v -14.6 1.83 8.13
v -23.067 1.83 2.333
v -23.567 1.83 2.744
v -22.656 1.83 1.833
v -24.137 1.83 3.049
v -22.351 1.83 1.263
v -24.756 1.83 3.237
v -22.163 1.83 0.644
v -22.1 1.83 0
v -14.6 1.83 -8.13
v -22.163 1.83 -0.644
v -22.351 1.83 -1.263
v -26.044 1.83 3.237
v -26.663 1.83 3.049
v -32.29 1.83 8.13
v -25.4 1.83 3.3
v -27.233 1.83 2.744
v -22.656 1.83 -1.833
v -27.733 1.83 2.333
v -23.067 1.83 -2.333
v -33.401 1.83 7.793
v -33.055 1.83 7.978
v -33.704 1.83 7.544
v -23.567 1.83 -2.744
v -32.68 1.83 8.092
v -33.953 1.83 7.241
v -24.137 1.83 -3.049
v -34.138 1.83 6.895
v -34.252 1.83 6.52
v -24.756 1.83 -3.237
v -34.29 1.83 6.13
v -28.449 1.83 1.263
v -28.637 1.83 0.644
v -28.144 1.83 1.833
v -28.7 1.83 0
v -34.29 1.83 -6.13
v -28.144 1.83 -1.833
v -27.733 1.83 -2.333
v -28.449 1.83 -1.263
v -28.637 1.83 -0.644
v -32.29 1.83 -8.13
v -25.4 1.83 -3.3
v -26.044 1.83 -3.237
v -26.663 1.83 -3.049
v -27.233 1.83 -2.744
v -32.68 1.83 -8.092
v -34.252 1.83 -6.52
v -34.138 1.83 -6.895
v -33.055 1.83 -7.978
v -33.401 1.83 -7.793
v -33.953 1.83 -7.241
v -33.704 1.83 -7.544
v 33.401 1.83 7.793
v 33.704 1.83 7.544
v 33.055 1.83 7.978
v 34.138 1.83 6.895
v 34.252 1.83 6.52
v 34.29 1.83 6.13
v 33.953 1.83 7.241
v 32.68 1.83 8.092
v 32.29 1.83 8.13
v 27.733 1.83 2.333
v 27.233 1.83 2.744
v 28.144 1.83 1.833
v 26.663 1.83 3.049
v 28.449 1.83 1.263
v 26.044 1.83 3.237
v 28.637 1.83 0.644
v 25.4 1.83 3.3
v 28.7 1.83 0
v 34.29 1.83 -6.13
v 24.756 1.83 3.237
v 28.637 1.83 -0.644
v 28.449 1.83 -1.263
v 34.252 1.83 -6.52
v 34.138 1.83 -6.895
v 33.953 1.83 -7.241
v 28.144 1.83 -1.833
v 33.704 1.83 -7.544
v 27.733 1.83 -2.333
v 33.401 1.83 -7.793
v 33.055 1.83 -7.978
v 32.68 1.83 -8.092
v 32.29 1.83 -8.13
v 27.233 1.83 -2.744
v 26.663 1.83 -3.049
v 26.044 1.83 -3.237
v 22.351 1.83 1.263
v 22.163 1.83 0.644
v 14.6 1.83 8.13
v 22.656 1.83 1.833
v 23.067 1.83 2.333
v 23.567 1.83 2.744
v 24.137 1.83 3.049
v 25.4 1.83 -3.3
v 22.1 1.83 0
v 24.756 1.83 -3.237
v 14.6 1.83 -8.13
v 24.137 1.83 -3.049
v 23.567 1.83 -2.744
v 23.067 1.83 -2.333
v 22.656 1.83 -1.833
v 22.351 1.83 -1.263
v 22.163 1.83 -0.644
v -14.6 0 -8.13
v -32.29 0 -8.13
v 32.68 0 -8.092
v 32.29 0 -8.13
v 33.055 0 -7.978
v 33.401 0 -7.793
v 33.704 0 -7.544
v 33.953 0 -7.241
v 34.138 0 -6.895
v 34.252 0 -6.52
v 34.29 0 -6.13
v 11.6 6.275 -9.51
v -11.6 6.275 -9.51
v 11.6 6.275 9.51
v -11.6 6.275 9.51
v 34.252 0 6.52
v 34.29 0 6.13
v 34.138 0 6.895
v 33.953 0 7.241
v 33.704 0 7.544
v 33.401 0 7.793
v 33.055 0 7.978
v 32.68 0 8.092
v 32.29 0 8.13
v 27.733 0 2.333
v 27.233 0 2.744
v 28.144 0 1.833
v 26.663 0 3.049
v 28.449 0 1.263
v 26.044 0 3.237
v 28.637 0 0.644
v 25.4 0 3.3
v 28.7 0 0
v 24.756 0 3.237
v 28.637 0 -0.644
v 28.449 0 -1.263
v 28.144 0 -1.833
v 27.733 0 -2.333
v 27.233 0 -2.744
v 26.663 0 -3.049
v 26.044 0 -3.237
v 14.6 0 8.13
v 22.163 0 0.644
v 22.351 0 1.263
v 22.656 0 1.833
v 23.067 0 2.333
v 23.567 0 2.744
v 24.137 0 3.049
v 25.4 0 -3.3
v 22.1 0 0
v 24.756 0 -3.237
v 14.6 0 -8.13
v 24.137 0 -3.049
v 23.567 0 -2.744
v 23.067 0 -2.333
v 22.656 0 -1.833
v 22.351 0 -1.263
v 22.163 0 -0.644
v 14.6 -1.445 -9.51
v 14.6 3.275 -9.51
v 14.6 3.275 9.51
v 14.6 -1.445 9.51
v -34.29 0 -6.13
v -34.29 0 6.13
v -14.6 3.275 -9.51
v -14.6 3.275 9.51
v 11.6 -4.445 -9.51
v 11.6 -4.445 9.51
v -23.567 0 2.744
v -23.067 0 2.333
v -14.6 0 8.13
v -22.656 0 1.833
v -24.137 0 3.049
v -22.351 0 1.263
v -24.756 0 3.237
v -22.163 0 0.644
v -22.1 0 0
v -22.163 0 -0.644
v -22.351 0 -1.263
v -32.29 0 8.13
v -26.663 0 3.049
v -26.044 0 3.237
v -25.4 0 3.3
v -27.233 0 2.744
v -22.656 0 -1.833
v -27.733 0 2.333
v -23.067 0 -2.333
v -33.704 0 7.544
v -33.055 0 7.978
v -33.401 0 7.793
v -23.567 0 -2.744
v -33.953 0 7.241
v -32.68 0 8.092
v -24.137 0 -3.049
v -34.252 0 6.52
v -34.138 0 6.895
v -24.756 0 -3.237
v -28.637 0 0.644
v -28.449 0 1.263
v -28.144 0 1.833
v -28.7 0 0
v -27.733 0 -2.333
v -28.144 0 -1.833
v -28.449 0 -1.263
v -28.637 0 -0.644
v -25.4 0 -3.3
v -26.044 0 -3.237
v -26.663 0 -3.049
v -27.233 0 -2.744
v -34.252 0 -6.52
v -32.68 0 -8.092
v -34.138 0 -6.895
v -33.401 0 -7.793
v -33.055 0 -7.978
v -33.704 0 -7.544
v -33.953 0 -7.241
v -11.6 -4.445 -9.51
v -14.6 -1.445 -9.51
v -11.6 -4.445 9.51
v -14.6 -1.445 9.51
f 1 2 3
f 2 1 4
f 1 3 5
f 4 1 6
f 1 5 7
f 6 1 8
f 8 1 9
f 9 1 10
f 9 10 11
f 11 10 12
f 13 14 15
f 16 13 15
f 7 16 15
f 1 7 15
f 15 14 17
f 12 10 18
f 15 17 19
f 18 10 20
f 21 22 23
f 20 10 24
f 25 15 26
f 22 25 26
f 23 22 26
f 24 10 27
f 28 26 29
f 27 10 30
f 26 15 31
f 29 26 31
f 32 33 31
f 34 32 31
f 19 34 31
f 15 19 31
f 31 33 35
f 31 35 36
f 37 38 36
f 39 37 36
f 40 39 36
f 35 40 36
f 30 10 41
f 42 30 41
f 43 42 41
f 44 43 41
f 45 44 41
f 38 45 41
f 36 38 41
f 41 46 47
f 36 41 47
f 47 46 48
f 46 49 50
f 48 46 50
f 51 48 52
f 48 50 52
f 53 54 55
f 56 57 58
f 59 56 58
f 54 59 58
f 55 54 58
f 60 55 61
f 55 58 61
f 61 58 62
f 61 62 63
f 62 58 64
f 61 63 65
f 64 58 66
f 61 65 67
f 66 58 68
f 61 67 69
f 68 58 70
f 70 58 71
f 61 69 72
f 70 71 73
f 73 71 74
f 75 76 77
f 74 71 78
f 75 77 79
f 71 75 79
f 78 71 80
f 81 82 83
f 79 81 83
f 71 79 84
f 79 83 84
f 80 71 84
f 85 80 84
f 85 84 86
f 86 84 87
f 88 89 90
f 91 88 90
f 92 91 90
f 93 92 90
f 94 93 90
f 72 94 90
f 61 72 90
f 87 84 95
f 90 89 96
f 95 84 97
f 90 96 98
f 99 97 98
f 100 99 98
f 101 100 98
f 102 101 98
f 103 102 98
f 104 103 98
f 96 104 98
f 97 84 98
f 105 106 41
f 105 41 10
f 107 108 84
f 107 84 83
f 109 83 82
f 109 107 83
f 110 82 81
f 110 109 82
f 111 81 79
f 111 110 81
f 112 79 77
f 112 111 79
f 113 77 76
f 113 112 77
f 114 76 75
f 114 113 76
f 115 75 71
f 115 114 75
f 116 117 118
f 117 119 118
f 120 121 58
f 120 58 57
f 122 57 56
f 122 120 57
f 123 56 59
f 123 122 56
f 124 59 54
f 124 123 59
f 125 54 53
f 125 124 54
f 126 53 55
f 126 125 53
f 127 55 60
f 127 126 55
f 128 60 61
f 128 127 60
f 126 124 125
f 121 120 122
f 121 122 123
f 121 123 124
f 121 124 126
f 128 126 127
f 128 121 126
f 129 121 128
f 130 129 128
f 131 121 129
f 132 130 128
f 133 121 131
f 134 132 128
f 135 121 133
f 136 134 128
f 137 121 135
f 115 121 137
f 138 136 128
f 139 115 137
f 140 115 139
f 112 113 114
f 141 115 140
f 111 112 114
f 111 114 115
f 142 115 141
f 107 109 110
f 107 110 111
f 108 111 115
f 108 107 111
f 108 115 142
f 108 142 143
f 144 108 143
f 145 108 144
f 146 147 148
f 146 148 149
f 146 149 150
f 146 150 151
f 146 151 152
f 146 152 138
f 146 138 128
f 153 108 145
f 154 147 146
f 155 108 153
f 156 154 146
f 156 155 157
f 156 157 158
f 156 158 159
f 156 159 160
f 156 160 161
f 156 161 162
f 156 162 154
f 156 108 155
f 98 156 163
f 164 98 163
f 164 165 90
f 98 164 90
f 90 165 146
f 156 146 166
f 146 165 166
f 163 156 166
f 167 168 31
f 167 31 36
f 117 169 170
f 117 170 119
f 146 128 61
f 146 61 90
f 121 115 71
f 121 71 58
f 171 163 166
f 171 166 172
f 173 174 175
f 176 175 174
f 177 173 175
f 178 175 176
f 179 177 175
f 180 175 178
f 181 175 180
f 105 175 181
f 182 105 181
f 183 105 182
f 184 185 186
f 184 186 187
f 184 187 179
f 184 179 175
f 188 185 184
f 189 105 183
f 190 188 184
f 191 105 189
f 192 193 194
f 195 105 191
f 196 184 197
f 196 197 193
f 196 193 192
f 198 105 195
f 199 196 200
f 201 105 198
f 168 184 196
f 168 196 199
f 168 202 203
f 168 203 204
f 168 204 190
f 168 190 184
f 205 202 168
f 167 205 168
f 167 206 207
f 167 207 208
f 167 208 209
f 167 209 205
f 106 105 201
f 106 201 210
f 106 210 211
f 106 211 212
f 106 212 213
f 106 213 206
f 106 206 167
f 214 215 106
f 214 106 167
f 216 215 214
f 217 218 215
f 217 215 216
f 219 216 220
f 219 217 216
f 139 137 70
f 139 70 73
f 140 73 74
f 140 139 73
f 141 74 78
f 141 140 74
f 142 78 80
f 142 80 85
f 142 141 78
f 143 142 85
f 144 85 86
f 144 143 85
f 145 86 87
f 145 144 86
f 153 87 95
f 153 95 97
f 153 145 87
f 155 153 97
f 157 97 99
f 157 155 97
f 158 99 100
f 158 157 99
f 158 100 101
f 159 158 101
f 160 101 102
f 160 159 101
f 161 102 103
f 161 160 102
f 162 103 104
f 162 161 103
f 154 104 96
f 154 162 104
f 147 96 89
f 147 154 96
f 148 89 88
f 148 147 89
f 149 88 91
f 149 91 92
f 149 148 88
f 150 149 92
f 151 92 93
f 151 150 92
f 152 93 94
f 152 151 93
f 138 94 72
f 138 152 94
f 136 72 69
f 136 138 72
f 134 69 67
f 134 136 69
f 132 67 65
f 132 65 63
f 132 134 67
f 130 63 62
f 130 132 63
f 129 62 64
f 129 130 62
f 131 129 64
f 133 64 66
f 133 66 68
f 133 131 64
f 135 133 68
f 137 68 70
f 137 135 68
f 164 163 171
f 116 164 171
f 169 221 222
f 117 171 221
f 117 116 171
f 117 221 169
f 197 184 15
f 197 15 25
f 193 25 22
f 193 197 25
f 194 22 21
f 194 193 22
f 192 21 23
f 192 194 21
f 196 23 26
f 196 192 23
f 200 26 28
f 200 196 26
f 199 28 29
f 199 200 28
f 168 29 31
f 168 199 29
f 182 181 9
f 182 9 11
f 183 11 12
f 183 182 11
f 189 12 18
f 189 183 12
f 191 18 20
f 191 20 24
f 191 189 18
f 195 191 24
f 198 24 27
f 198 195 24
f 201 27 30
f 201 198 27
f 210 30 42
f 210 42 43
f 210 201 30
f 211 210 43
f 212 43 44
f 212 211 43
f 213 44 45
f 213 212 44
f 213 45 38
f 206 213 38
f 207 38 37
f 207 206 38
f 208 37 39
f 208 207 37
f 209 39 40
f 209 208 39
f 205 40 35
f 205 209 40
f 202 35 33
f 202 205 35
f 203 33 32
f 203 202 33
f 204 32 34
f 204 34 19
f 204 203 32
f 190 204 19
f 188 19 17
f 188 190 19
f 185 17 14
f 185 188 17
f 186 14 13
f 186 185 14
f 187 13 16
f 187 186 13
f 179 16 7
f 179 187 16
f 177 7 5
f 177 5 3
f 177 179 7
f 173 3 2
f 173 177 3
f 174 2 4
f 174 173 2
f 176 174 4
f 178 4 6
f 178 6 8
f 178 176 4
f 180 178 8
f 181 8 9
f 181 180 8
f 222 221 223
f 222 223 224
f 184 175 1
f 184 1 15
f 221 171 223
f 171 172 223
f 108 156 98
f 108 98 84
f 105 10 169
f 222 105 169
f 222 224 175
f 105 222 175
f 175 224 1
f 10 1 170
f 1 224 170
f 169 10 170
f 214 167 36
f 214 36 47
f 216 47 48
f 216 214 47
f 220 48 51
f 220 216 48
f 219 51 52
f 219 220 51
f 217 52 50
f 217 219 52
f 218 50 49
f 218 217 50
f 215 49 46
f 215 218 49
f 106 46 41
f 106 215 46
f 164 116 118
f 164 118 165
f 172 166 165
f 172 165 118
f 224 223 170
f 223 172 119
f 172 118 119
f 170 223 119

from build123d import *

# Parameters (mm, degrees)
SKETCH1_R                = 3.3
BOSS_EXTRUDE1_DEPTH      = 1.83
BOSS_EXTRUDE2_DEPTH      = 9.51
BOSS_EXTRUDE2_DEPTH_BACK = 9.51


with BuildPart() as part:
    # Sketch1 → Boss-Extrude1 (new body)
    with BuildSketch(Plane(origin=(0, 0, 0), x_dir=(1, 0, 0), z_dir=(0, 1, 0))):
        with BuildLine():
            Line((-32.29, 8.13), (32.29, 8.13))
            ThreePointArc((32.29, 8.13), (33.704213562, 7.544213562), (34.29, 6.13))
            Line((34.29, 6.13), (34.29, -6.13))
            ThreePointArc((34.29, -6.13), (33.704213562, -7.544213562), (32.29, -8.13))
            Line((32.29, -8.13), (-32.29, -8.13))
            ThreePointArc((-32.29, -8.13), (-33.704213562, -7.544213562), (-34.29, -6.13))
            Line((-34.29, -6.13), (-34.29, 6.13))
            ThreePointArc((-34.29, 6.13), (-33.704213562, 7.544213562), (-32.29, 8.13))
        make_face()
        with Locations((25.4, 0)):
            Circle(SKETCH1_R, mode=Mode.SUBTRACT)
        with Locations((-25.4, 0)):
            Circle(SKETCH1_R, mode=Mode.SUBTRACT)
    extrude(amount=BOSS_EXTRUDE1_DEPTH)

    # Sketch2 → Boss-Extrude2 (add, two sides)
    with BuildSketch(Plane.XY) as boss_extrude2_sk:
        Polygon((-14.6, 3.275), (-11.6, 6.275), (11.6, 6.275), (14.6, 3.275), (14.6, -1.445), (11.6, -4.445), (-11.6, -4.445), (-14.6, -1.445), align=None)
    extrude(amount=BOSS_EXTRUDE2_DEPTH)
    extrude(boss_extrude2_sk.sketch, amount=-BOSS_EXTRUDE2_DEPTH_BACK)


solid = part.part
